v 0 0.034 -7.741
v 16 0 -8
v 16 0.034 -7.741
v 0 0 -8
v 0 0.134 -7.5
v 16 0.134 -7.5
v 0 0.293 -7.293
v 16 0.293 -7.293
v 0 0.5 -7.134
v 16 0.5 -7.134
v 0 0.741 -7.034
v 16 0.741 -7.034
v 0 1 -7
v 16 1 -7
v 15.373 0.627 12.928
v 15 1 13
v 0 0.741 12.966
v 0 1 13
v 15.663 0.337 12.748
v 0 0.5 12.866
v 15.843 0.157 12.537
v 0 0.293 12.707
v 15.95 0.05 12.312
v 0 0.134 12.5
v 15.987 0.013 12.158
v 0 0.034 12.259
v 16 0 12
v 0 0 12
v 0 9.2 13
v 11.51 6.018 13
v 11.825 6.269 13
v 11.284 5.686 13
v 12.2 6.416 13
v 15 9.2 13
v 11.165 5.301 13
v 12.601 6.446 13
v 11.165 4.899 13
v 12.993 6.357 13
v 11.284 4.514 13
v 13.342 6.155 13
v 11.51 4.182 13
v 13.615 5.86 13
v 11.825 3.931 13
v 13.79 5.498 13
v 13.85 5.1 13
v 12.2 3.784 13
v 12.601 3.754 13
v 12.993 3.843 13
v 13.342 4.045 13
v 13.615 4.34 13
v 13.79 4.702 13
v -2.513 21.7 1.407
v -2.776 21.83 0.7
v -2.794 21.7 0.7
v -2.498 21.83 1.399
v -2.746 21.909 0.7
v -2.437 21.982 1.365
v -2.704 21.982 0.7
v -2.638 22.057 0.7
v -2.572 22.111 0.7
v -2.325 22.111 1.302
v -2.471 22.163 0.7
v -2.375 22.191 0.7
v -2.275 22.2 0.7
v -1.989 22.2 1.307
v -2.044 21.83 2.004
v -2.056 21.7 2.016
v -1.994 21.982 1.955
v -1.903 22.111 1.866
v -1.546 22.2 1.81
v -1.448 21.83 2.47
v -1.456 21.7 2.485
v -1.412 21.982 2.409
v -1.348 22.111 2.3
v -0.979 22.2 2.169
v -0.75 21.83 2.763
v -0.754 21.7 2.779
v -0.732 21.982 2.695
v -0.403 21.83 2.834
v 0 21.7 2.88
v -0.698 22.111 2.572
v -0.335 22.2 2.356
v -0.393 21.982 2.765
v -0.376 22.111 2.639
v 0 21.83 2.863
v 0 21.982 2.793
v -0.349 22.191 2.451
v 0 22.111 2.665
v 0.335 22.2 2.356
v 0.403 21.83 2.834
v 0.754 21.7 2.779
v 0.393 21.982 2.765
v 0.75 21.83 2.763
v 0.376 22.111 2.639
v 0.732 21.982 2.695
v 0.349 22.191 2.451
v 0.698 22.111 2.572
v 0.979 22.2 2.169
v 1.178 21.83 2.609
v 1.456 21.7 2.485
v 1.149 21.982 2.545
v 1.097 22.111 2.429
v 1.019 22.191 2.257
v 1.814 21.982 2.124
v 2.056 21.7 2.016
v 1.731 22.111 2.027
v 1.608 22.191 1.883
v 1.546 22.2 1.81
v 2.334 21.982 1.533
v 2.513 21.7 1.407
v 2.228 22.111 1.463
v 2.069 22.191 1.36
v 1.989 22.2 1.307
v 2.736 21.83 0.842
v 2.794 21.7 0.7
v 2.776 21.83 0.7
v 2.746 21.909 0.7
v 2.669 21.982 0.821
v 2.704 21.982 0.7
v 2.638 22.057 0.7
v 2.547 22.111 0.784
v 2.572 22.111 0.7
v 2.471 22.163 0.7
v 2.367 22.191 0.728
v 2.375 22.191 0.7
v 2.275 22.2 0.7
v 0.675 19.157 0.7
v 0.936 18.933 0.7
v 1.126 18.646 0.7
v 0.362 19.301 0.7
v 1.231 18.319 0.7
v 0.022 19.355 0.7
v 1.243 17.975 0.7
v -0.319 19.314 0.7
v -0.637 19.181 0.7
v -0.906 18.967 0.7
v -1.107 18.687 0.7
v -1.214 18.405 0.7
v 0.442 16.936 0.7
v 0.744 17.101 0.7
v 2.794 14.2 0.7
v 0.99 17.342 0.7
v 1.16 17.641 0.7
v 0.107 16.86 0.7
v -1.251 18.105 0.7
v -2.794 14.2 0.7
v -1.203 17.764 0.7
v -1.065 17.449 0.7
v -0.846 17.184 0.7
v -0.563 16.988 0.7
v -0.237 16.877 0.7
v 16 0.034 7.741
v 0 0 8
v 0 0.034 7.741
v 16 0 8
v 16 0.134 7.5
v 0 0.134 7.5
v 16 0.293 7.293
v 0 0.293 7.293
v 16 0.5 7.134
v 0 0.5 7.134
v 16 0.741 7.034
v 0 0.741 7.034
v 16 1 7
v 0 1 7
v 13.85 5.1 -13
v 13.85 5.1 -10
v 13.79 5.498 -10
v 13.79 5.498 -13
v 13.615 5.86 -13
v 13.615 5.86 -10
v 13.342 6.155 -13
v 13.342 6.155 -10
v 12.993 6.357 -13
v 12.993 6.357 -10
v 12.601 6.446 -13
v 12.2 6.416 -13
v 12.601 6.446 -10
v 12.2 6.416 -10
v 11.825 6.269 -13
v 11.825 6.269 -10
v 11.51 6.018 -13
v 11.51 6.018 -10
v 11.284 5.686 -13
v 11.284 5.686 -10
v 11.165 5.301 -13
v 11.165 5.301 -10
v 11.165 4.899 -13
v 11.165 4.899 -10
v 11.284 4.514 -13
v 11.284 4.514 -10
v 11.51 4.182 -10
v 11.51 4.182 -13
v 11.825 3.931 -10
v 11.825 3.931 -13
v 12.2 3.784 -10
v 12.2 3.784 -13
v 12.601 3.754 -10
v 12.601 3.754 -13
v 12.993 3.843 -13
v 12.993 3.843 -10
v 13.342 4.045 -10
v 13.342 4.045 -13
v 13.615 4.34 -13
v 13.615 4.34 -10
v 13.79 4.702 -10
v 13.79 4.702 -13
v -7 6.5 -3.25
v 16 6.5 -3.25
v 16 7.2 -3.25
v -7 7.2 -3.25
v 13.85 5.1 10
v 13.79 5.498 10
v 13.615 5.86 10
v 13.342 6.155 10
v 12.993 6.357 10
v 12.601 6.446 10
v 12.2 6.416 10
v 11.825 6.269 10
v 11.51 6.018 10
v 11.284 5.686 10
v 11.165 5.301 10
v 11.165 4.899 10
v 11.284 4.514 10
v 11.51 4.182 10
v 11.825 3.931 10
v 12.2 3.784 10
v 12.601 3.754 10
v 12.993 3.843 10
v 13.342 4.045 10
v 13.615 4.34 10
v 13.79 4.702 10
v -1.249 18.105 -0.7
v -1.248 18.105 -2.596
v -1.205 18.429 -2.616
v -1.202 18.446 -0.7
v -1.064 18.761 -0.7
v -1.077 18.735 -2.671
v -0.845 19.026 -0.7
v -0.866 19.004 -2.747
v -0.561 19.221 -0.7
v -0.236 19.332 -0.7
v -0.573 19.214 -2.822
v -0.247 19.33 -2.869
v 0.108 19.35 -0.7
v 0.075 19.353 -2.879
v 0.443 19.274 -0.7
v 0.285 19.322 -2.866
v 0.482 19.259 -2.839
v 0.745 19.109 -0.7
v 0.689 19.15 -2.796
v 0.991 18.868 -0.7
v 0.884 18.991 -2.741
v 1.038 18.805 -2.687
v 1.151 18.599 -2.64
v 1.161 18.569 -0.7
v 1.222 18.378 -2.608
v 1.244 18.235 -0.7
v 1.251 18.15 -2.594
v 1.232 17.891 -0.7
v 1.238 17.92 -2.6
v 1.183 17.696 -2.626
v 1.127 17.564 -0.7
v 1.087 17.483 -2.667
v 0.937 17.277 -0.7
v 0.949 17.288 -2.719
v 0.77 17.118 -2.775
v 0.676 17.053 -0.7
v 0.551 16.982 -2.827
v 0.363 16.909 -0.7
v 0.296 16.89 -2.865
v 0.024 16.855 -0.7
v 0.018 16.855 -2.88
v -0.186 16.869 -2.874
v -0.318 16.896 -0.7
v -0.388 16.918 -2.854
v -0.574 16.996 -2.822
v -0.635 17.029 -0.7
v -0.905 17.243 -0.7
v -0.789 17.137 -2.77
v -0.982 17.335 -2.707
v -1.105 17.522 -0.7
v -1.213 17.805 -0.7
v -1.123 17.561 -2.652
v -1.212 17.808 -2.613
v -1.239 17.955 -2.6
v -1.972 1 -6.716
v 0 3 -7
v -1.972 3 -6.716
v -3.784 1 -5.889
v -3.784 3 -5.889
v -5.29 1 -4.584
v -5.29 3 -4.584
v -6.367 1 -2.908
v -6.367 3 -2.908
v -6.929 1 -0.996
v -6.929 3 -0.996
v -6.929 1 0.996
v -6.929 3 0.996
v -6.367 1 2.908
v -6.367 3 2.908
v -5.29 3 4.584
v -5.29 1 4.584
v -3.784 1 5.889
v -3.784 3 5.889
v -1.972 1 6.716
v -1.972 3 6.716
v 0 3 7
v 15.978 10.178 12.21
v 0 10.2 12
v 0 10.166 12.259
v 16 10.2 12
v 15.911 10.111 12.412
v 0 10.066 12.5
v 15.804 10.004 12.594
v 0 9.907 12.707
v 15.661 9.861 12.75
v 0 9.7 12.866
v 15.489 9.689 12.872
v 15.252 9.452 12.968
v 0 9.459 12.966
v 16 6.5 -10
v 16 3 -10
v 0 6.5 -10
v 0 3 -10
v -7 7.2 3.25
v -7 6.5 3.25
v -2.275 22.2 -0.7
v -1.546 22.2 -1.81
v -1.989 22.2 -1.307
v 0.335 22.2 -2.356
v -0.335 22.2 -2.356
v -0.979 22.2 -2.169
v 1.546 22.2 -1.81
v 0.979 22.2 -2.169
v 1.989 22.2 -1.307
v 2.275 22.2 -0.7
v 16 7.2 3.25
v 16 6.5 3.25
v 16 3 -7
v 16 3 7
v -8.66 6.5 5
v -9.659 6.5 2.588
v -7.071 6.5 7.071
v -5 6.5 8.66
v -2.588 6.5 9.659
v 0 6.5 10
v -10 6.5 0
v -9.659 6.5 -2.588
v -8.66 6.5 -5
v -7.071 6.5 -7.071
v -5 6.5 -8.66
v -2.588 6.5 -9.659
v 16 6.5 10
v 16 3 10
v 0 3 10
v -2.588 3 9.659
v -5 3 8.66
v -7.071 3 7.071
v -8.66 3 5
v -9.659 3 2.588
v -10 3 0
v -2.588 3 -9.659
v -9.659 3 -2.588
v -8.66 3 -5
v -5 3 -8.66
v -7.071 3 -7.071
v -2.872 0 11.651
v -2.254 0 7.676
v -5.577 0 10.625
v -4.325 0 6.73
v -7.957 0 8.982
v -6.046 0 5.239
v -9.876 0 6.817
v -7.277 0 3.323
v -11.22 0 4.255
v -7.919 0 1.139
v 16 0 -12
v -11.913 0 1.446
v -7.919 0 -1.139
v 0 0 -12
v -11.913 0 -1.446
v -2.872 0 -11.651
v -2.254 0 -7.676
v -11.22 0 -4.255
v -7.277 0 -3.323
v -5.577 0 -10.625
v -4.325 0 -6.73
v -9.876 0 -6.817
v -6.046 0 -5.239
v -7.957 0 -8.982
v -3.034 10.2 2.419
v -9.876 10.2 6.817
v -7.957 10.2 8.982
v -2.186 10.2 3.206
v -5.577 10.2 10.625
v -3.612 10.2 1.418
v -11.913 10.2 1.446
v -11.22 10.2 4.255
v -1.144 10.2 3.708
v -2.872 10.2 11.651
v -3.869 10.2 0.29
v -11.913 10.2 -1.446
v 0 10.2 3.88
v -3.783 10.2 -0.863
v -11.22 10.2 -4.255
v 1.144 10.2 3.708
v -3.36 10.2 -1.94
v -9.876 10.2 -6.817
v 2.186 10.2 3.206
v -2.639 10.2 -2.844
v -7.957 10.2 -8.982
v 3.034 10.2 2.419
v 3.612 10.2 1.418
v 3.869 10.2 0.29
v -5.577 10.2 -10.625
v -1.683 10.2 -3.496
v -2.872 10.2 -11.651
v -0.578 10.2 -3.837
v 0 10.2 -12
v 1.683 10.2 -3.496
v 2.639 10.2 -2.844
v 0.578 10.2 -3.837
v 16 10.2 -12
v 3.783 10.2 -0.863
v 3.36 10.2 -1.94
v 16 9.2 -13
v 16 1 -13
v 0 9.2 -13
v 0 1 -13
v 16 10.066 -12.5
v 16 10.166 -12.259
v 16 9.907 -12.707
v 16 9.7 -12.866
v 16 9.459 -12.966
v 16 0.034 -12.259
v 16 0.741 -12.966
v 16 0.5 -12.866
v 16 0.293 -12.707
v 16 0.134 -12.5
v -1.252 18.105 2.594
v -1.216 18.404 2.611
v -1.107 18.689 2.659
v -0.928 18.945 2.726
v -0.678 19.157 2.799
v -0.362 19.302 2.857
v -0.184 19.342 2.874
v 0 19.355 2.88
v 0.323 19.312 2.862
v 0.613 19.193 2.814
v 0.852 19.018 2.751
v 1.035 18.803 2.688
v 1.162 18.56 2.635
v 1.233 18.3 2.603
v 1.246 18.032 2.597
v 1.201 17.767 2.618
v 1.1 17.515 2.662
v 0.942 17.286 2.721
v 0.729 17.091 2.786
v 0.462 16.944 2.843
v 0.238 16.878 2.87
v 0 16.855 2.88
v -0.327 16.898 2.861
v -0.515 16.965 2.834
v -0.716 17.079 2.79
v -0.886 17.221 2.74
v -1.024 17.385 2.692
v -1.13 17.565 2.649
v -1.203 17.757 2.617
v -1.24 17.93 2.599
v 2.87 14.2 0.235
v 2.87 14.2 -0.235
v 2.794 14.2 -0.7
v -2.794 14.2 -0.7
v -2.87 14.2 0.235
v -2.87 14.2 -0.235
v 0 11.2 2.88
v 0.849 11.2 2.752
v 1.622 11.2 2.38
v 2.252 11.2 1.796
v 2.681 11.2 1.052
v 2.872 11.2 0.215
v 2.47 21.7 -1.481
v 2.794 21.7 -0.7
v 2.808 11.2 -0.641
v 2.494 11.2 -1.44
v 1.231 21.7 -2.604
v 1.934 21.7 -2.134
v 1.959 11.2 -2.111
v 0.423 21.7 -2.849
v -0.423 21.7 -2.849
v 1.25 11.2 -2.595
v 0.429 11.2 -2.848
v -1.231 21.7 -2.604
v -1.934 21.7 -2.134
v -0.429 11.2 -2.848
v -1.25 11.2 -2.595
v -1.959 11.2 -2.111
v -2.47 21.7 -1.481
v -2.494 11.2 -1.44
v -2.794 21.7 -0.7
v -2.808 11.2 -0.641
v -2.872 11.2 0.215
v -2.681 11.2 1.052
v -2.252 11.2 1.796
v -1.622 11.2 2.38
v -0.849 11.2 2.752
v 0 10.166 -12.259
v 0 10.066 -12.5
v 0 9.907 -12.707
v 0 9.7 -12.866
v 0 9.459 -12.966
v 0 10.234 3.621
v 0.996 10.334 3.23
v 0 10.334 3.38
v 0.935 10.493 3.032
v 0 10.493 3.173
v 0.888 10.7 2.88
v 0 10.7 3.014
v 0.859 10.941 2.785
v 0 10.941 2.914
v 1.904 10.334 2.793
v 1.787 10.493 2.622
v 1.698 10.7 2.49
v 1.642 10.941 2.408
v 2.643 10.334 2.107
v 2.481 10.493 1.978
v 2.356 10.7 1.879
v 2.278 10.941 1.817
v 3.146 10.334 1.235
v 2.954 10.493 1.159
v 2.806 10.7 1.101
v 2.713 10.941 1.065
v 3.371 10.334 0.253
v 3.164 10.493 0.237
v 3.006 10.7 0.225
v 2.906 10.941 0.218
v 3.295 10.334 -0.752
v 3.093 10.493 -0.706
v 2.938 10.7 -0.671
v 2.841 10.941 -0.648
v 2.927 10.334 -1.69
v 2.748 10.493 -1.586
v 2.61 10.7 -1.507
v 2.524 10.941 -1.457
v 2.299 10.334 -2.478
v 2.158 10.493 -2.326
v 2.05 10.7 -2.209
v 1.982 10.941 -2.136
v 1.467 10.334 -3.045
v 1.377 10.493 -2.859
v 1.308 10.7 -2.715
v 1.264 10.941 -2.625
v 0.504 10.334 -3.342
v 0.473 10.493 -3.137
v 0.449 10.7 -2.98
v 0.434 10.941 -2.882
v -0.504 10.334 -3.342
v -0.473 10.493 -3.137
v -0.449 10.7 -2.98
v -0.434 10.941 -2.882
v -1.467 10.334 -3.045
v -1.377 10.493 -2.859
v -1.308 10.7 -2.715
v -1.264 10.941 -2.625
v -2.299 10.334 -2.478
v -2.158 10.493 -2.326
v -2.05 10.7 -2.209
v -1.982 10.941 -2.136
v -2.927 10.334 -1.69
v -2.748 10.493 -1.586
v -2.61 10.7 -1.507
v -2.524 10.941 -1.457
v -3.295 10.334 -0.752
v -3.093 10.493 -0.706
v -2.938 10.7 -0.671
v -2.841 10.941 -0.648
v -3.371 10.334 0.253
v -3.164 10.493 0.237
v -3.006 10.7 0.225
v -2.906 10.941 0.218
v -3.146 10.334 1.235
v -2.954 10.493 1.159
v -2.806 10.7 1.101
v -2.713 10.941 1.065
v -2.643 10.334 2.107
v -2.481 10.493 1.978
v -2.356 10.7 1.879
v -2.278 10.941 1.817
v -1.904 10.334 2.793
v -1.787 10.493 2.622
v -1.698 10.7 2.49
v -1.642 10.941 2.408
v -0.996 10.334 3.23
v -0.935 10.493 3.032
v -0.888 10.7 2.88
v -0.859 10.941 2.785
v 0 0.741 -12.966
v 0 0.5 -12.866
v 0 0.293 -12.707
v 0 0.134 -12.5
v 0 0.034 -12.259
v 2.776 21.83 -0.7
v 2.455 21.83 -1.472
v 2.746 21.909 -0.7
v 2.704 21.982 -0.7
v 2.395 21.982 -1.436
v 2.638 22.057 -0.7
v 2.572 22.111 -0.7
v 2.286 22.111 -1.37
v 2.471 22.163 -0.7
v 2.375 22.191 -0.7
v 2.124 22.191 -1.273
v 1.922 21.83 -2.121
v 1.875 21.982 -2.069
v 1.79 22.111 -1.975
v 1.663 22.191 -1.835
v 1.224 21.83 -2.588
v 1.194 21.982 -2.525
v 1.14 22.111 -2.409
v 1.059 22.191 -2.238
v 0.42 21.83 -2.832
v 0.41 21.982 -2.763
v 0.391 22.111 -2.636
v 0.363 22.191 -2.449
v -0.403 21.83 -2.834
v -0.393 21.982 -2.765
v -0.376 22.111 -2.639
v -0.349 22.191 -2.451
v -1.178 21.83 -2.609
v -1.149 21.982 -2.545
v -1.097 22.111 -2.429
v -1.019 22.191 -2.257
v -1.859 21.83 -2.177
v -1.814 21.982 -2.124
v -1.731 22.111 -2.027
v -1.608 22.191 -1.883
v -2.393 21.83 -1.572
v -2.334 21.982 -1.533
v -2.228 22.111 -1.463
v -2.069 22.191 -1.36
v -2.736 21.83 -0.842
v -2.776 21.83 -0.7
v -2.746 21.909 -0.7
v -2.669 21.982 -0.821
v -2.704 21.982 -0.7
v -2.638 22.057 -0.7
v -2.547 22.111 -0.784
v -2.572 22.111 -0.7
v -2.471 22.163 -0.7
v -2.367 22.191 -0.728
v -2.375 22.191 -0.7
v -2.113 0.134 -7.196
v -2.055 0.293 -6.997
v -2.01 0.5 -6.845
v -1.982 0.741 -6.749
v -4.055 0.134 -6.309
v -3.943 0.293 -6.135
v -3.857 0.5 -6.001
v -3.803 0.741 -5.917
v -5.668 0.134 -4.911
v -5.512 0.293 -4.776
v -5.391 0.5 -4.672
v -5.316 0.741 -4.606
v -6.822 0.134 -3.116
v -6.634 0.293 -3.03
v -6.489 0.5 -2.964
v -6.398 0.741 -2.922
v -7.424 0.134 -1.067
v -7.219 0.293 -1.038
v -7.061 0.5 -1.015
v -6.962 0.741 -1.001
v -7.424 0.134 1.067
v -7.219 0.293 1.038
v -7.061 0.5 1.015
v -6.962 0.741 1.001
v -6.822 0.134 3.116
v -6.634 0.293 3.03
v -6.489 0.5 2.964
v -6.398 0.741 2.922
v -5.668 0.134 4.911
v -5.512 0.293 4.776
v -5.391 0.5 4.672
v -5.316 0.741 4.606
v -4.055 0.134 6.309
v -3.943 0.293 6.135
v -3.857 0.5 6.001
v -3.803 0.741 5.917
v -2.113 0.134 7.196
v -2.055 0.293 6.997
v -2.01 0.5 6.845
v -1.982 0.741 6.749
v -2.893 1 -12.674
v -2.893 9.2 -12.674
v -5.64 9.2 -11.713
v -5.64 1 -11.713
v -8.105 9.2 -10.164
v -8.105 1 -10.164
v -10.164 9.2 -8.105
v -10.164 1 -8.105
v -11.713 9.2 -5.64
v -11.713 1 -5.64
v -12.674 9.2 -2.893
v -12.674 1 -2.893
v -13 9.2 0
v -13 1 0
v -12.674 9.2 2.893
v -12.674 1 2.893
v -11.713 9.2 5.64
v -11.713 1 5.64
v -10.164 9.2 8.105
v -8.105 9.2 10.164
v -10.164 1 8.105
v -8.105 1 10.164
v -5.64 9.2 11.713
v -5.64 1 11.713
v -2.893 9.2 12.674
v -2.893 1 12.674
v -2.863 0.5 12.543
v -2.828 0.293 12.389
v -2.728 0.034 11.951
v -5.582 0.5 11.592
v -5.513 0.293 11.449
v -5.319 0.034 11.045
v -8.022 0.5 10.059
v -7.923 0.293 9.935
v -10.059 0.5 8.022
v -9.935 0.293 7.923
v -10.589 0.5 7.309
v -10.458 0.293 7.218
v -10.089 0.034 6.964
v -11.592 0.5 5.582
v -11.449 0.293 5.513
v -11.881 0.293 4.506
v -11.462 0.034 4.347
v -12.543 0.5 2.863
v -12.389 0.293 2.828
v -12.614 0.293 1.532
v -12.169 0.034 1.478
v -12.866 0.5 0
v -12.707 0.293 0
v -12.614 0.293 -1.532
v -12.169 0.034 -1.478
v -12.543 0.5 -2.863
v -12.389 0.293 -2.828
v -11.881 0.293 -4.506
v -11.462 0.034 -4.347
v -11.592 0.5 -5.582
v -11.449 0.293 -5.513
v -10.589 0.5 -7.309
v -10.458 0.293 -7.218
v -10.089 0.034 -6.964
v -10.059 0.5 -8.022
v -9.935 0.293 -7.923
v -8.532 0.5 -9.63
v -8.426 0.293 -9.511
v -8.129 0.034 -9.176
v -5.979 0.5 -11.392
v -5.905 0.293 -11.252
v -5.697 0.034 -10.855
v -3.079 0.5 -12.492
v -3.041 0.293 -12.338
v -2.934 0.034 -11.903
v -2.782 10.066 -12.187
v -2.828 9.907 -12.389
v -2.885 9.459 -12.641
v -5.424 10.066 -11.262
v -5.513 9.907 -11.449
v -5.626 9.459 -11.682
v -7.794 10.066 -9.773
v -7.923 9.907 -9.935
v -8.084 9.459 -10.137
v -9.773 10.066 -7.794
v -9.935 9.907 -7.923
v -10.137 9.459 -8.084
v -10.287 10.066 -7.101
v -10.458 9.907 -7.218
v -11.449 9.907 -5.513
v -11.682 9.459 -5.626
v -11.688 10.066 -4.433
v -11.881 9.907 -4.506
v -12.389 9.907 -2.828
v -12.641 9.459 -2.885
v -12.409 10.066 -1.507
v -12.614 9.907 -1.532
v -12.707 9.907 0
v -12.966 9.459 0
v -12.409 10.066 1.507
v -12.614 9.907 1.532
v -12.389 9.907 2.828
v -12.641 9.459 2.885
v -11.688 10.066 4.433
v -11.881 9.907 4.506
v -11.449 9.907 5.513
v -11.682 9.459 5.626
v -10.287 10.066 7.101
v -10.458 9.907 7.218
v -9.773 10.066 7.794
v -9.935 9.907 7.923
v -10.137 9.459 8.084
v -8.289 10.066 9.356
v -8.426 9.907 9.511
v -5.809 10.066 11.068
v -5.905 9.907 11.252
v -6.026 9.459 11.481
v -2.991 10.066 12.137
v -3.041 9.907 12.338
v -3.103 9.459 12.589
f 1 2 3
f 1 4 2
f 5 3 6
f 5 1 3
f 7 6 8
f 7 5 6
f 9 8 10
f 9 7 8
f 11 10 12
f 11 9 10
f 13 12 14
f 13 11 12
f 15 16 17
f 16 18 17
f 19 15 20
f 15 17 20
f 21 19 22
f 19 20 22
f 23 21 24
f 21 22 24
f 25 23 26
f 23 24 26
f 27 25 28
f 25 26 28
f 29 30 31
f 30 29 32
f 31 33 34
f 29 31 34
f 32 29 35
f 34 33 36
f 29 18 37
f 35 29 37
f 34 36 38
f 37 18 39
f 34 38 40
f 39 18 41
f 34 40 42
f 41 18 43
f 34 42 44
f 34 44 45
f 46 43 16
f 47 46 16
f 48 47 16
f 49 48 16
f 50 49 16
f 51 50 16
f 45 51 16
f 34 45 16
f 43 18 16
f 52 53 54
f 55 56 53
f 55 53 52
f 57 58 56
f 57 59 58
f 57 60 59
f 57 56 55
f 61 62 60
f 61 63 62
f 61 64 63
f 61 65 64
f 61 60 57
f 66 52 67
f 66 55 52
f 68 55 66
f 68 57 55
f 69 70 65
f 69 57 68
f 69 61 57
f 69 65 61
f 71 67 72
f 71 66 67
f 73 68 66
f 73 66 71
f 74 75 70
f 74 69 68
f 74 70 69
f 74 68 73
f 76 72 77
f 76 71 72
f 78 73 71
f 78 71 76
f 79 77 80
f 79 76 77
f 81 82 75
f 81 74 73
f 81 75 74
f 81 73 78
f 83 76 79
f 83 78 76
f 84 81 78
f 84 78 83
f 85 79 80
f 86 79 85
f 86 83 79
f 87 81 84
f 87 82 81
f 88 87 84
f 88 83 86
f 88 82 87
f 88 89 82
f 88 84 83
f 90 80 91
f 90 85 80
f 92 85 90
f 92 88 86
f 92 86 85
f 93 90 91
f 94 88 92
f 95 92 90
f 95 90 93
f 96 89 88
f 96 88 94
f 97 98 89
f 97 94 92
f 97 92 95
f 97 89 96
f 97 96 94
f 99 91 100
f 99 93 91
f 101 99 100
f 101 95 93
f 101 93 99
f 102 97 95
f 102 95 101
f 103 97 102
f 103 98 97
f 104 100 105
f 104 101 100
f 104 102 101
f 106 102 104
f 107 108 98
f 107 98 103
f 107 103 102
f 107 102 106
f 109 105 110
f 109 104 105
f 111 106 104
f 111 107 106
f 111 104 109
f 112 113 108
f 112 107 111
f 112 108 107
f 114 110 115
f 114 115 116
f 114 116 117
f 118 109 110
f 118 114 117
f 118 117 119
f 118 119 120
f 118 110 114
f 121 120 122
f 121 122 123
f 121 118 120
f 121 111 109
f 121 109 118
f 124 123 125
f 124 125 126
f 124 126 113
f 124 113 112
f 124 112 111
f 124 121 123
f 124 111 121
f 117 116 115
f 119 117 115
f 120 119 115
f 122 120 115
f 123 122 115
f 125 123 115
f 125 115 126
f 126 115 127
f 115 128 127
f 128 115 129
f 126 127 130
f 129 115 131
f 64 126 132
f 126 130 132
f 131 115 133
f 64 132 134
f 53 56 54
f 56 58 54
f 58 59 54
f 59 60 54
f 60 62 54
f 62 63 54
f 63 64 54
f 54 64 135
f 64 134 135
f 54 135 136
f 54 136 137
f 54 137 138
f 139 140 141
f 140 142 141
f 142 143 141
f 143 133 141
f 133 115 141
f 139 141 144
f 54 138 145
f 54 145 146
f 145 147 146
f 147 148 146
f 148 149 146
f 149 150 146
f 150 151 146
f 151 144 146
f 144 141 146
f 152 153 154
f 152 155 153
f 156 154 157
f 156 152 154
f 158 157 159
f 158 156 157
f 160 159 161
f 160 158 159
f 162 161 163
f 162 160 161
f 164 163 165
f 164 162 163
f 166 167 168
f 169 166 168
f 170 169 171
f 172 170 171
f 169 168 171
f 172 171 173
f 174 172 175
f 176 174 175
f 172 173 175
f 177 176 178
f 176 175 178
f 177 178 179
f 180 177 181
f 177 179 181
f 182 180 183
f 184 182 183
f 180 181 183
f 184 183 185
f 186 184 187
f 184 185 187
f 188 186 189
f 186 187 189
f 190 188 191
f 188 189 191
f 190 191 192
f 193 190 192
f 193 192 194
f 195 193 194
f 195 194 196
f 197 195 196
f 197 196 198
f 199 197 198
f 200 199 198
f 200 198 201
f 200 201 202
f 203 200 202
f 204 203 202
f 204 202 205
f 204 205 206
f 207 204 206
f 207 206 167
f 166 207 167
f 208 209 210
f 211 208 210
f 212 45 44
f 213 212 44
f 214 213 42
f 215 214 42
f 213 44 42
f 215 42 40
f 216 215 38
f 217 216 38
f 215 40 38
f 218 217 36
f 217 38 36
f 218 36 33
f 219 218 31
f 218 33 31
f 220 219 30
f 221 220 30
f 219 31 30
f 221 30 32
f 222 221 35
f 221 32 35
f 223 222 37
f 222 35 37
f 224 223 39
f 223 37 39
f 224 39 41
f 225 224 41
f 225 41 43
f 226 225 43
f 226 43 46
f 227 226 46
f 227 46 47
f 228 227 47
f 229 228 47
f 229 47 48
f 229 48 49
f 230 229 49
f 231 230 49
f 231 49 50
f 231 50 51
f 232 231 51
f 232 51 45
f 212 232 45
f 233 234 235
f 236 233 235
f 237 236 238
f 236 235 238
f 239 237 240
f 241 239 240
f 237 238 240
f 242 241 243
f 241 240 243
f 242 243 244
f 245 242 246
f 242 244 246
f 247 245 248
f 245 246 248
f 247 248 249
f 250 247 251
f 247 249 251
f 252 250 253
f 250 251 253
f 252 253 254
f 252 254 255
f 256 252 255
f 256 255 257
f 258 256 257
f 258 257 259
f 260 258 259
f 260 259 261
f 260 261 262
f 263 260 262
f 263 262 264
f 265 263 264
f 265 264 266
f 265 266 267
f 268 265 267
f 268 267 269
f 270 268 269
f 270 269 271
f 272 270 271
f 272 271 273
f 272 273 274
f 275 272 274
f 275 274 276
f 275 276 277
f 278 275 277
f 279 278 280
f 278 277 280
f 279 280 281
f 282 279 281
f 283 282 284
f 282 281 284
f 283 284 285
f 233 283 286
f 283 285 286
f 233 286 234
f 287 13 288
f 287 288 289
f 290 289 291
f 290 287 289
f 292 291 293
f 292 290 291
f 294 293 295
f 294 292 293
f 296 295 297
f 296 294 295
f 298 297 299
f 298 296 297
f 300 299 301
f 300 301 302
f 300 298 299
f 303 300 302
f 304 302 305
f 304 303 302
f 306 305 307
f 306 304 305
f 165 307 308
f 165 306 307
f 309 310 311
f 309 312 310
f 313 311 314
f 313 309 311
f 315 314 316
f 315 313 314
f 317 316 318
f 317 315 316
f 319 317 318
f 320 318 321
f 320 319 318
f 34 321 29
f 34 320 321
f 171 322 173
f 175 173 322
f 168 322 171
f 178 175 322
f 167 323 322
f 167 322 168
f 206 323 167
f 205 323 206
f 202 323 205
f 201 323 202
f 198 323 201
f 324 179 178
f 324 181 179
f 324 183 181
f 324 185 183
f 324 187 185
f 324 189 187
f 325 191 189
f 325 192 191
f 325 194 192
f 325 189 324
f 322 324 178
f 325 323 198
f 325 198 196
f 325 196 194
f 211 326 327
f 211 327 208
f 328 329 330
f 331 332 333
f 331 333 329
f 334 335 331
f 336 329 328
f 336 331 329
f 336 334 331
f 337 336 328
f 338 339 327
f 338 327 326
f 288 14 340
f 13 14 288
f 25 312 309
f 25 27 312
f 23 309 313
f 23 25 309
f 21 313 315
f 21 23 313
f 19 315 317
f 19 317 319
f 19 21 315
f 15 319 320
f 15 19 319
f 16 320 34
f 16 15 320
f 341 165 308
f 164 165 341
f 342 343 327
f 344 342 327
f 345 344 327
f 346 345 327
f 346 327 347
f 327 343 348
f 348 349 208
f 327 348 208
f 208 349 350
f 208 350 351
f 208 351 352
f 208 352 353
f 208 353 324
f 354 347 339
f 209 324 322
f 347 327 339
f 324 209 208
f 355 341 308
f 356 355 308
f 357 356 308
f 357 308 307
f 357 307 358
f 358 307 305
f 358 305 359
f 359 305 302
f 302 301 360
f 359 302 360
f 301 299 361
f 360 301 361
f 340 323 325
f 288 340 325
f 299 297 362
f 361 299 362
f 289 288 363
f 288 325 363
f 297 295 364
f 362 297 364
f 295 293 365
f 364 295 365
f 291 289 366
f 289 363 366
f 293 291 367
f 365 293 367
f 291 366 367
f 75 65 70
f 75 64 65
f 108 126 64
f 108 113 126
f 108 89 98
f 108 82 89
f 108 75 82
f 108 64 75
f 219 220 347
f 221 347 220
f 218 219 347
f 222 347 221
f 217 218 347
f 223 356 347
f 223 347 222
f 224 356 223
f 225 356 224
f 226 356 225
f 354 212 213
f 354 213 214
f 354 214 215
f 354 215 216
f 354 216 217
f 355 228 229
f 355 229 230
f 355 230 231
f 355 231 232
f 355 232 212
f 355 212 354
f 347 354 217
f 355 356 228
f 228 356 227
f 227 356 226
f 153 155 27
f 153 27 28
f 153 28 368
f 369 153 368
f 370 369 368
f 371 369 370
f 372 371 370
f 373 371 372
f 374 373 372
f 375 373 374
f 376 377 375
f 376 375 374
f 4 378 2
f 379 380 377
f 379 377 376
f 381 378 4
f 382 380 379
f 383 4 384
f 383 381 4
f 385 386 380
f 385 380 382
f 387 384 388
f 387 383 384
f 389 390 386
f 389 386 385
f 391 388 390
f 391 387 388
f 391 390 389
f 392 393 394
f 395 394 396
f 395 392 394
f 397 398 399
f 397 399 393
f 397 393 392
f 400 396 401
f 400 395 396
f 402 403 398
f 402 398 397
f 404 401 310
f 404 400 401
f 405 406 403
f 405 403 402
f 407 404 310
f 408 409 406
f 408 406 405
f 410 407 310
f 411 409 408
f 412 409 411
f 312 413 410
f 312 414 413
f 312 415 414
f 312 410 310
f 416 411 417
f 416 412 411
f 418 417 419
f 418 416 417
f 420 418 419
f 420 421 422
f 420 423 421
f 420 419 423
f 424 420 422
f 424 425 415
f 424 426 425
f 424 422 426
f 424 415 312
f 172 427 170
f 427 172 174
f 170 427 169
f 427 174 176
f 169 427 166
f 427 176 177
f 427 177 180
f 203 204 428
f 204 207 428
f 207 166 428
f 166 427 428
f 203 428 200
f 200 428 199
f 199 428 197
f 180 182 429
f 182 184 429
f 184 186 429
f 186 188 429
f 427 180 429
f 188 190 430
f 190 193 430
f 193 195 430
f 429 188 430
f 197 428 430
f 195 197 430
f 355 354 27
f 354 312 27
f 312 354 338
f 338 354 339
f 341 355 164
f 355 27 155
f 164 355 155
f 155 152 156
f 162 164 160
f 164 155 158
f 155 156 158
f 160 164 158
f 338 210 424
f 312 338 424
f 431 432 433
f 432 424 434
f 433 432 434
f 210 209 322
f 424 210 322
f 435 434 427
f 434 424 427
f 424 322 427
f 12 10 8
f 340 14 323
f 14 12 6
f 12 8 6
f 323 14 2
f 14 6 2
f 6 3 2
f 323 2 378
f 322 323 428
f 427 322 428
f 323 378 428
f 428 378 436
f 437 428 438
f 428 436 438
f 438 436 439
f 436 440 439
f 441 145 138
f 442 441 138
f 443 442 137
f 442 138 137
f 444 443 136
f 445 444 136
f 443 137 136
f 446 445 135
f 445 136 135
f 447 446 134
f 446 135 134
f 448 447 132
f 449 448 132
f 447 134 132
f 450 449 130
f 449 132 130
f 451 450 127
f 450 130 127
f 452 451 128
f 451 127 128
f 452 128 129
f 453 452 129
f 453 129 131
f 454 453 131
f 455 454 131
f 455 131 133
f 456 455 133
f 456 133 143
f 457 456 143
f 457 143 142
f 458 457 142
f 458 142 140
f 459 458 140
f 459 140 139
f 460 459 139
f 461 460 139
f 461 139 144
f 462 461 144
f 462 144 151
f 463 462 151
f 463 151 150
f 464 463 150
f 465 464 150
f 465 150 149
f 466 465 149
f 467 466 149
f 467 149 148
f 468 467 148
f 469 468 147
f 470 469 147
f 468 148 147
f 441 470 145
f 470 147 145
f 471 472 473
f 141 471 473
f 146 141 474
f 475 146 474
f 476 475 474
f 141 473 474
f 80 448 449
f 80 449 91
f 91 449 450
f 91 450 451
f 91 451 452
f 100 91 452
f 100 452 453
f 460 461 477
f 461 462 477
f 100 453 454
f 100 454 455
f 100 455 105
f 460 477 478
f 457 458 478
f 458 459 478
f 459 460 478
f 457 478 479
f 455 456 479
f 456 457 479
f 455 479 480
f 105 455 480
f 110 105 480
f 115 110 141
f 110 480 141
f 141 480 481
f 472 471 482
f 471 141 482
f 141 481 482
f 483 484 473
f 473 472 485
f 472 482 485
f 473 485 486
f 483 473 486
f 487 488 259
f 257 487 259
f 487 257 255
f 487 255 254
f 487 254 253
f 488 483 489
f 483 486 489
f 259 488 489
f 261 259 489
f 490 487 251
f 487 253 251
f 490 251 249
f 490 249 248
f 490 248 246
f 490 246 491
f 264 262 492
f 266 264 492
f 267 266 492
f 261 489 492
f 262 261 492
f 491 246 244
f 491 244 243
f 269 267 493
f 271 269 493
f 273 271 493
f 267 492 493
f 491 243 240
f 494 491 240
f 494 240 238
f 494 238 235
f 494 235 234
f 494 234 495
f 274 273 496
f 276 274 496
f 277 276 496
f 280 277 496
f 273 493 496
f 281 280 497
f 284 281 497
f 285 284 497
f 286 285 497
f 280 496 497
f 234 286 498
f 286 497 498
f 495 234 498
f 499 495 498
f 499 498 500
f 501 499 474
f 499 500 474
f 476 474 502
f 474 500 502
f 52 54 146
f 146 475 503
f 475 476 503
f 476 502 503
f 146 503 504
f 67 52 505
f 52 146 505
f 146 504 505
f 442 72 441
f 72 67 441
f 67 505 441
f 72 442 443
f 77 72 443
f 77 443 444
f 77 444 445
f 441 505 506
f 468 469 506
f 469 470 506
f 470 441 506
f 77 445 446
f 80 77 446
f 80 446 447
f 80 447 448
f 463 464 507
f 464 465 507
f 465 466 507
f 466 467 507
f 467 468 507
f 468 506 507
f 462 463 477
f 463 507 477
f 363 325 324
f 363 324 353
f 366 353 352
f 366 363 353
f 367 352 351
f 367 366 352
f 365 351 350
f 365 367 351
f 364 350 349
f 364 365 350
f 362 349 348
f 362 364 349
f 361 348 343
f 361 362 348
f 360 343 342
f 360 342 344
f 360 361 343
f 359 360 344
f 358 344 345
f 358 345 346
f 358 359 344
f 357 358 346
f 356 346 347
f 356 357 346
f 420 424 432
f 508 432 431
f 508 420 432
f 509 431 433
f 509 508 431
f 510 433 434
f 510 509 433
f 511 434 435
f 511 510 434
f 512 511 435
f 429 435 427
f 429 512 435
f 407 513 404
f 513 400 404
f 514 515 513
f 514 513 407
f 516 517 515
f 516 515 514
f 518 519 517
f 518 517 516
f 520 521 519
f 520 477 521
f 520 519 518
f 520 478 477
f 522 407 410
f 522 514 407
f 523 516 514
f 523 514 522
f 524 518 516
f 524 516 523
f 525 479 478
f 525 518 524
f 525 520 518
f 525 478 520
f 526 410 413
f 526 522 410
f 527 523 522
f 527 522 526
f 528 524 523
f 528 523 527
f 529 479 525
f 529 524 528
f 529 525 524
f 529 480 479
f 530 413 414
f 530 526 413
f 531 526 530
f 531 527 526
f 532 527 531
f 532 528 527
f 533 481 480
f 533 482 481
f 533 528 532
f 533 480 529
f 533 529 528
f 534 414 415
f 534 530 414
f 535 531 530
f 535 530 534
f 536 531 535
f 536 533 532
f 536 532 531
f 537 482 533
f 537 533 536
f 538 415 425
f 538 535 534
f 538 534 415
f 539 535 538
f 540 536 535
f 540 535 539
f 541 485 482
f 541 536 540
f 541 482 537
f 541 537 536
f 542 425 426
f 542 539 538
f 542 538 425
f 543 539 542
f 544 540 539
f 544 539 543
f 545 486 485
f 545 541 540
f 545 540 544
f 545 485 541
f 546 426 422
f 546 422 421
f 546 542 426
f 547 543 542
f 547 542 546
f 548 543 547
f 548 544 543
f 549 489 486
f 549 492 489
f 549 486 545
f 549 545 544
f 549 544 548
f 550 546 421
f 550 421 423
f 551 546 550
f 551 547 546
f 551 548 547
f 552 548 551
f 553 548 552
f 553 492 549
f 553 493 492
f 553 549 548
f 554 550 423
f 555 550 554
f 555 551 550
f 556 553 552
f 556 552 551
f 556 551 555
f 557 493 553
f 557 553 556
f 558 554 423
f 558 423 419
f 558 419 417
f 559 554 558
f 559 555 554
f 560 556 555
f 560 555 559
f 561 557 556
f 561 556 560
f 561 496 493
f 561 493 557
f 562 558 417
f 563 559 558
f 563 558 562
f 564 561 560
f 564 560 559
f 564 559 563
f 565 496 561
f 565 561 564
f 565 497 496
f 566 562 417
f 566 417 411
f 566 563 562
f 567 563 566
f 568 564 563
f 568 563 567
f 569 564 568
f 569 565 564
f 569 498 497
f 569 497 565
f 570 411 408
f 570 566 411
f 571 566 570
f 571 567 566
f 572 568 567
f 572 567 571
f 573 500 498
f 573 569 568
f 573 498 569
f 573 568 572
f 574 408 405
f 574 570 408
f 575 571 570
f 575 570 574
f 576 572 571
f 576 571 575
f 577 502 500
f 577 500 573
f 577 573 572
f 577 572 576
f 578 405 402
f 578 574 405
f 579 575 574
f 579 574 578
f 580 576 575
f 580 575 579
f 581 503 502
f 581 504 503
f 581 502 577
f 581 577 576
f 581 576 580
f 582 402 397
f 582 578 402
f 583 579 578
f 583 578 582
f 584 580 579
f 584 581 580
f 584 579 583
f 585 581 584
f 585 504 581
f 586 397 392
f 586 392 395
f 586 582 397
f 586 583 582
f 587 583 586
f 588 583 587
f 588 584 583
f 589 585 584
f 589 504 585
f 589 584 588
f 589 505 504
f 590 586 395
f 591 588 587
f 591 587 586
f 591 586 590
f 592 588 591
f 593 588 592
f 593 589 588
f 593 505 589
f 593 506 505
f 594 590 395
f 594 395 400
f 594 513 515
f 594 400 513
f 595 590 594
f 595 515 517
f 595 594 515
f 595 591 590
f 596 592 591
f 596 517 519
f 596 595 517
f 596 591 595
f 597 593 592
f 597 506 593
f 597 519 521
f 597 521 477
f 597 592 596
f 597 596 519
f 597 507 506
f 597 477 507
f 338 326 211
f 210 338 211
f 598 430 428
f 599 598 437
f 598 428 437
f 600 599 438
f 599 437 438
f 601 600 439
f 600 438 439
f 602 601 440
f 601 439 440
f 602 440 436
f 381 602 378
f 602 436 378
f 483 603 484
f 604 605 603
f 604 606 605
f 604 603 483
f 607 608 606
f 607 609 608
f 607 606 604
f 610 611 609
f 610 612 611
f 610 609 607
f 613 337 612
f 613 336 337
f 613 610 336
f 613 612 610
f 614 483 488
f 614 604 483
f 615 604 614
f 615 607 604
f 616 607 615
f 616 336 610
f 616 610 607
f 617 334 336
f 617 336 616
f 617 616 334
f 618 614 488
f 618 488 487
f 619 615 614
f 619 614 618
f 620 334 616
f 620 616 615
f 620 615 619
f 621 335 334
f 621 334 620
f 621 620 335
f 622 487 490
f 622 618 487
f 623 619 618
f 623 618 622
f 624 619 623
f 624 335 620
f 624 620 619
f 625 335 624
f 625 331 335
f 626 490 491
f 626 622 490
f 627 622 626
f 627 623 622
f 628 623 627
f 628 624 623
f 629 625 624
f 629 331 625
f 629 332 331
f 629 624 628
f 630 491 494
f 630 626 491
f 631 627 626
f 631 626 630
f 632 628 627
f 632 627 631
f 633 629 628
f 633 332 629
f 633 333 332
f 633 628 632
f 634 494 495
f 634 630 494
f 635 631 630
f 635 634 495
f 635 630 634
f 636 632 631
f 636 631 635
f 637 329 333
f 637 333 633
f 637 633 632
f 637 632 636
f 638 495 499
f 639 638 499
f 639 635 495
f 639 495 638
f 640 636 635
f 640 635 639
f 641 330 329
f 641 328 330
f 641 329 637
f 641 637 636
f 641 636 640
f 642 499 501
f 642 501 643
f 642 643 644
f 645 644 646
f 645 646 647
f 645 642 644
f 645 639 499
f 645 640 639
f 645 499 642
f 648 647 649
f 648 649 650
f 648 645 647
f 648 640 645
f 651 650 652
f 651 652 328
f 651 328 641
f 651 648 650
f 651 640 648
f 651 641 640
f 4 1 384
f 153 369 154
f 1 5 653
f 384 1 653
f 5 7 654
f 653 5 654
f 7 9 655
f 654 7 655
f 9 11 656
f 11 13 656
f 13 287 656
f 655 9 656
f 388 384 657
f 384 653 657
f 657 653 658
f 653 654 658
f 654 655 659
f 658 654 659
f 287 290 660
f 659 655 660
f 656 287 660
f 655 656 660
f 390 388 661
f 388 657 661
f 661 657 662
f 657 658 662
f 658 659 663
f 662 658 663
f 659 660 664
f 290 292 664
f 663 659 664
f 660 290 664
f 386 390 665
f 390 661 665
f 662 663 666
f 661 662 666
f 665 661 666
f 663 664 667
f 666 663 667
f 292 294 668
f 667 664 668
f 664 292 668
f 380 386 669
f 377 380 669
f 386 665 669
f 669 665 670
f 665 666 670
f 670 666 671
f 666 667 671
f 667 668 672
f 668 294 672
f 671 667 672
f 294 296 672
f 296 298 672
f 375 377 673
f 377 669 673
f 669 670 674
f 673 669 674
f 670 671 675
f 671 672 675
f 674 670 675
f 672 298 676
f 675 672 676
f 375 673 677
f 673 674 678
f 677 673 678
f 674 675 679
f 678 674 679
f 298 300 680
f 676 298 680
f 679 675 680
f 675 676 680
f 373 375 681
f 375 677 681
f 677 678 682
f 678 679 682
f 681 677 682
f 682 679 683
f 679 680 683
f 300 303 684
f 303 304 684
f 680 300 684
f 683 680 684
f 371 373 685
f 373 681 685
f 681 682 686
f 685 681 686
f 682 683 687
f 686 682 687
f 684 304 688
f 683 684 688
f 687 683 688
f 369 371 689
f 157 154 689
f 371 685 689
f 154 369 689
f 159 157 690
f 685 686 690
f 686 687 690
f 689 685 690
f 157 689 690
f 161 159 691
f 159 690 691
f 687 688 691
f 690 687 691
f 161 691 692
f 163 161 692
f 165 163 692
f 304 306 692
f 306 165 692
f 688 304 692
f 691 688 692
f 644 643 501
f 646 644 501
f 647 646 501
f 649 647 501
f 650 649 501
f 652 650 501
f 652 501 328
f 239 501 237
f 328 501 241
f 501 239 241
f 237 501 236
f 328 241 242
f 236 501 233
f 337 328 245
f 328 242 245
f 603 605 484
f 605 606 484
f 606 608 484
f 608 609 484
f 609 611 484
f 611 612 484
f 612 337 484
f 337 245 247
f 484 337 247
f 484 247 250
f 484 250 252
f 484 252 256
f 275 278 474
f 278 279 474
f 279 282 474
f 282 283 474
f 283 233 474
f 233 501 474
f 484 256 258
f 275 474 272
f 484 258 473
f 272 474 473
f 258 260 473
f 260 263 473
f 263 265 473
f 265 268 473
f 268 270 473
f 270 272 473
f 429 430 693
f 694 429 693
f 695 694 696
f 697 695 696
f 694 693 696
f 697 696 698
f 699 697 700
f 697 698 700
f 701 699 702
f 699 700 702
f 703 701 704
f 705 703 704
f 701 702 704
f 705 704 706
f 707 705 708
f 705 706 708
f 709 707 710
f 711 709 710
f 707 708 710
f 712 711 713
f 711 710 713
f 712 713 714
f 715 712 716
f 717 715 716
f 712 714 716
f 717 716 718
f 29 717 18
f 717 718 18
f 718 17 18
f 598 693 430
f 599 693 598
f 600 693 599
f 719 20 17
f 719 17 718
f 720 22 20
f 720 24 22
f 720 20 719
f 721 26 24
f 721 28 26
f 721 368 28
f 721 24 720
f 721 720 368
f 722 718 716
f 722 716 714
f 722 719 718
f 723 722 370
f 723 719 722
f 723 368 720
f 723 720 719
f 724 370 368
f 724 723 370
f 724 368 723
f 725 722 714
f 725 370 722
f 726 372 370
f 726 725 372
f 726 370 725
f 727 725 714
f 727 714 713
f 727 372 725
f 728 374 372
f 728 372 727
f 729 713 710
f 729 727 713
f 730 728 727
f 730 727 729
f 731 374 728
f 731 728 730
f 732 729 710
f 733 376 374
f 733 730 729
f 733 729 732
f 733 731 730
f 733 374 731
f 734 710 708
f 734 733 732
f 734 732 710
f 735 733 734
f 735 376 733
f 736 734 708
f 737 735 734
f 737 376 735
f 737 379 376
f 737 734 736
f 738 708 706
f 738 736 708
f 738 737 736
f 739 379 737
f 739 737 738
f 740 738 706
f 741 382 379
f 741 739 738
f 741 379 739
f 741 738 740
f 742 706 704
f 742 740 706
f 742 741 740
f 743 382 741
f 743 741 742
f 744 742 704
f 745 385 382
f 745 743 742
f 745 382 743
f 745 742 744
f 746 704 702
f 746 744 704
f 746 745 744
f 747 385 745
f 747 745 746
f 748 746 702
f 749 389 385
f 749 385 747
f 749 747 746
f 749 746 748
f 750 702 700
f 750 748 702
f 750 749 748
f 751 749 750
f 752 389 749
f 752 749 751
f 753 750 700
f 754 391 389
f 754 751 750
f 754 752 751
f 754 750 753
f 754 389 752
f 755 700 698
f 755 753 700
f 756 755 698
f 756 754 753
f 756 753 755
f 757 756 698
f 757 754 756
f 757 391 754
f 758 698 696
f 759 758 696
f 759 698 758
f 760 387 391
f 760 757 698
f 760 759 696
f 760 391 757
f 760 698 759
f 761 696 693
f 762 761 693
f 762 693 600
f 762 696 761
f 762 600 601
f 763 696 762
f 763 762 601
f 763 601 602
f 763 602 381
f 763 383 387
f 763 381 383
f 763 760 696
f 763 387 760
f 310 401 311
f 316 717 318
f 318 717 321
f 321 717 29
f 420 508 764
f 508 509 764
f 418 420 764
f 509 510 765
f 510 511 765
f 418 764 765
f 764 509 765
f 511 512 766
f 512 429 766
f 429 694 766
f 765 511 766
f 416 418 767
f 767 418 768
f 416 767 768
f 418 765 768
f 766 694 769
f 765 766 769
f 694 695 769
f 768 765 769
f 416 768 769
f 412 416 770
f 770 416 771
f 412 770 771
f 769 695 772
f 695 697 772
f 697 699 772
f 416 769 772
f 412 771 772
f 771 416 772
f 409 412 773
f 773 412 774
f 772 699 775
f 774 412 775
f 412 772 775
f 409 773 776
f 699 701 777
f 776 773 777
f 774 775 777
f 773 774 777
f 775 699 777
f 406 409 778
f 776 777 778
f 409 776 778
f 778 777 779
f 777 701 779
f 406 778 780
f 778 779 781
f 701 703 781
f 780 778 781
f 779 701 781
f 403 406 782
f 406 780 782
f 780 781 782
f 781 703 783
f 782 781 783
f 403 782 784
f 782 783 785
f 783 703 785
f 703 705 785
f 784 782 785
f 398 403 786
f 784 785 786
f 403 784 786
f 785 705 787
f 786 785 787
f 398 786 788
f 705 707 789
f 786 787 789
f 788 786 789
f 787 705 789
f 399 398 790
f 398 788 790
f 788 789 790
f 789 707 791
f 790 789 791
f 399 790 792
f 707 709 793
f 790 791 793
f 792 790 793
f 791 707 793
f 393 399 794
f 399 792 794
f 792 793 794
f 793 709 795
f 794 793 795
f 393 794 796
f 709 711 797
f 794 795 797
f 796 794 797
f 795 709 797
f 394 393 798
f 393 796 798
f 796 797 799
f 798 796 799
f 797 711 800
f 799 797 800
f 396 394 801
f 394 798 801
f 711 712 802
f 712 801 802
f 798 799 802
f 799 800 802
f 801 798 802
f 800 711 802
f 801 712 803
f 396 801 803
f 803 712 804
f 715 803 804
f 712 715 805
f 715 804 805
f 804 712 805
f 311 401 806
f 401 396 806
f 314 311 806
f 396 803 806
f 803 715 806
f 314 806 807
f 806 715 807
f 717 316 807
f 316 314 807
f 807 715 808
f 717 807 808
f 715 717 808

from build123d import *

# Parameters (mm, degrees)
BOSS_EXTRUDE1_DEPTH   = 3
BOSS_EXTRUDE2_DEPTH   = 3.5
BOSS_EXTRUDE3_DEPTH   = 3.7
SKETCH4_R             = 2.88
BOSS_EXTRUDE4_DEPTH   = 12
SKETCH11_W            = 6.5
SKETCH11_H            = 0.7
CUT_EXTRUDE3_DEPTH    = 23
F_2_5MM_DOWEL_HOLE1_D = 2.5
SKETCH8_R             = 1.35
CUT_EXTRUDE1_DEPTH    = 38.747052924
FILLET1_R             = 1
FILLET2_R             = 1
CUT_EXTRUDE2_START    = -8
CUT_EXTRUDE2_DEPTH    = 8
FILLET3_R             = 0.5


with BuildPart() as part:
    # Sketch1 → Boss-Extrude1 (new body)
    with BuildSketch(Plane(origin=(0, 0, 0), x_dir=(1, 0, 0), z_dir=(0, 1, 0))):
        with BuildLine():
            Line((0, 13), (16, 13))
            Line((16, 13), (16, 7))
            Line((16, 7), (0, 7))
            ThreePointArc((0, 7), (-7, 0), (0, -7))
            Line((0, -7), (16, -7))
            Line((16, -7), (16, -13))
            Line((16, -13), (0, -13))
            ThreePointArc((0, -13), (-13, 0), (0, 13))
        make_face()
    extrude(amount=BOSS_EXTRUDE1_DEPTH)

    # Sketch2 → Boss-Extrude2 (add)
    with BuildSketch(Plane(origin=(0, 3, 0), x_dir=(1, 0, 0), z_dir=(0, 1, 0))):
        with BuildLine():
            Line((0, 13), (16, 13))
            Line((16, 13), (16, 10))
            Line((16, 10), (0, 10))
            ThreePointArc((0, 10), (-10, 0), (0, -10))
            Line((0, -10), (16, -10))
            Line((16, -10), (16, -13))
            Line((16, -13), (0, -13))
            ThreePointArc((0, -13), (-13, 0), (0, 13))
        make_face()
    extrude(amount=BOSS_EXTRUDE2_DEPTH)

    # Sketch3 → Boss-Extrude3 (add)
    with BuildSketch(Plane(origin=(0, 6.5, 0), x_dir=(1, 0, 0), z_dir=(0, 1, 0))):
        with BuildLine():
            Line((16, 13), (0, 13))
            ThreePointArc((0, 13), (-13, 0), (0, -13))
            Line((0, -13), (16, -13))
            Line((16, -13), (16, -7))
            Line((16, -7), (16, 7))
            Line((16, 7), (16, 13))
        make_face()
    extrude(amount=BOSS_EXTRUDE3_DEPTH)

    # Sketch4 → Boss-Extrude4 (add)
    with BuildSketch(Plane(origin=(0, 10.2, 0), x_dir=(1, 0, 0), z_dir=(0, 1, 0))):
        with Locations(Location((0, 0, 0), (0, 0, 270))):
            Circle(SKETCH4_R)
    extrude(amount=BOSS_EXTRUDE4_DEPTH)

    # Sketch11 → Cut-Extrude3 (cut)
    with BuildSketch(Plane(origin=(16, 0, 0), x_dir=(0, 0, -1), z_dir=(1, 0, 0))):
        with Locations((0, 6.85)):
            Rectangle(SKETCH11_W, SKETCH11_H)
    extrude(amount=-CUT_EXTRUDE3_DEPTH, mode=Mode.SUBTRACT)

    # Ø2.5mm Dowel Hole1 (through all)
    with Locations(Plane(origin=(-0.002429038, 18.104937254, 2.879998976), x_dir=(0.999999644325, 0, 0.000843415861), z_dir=(-0.000843415861, 0, 0.999999644325))):
        with Locations((0, 0)):
            Hole(F_2_5MM_DOWEL_HOLE1_D / 2)

    # Sketch8 → Cut-Extrude1 (cut, through all)
    with BuildSketch(Plane.XY.offset(13)):
        with Locations((12.5, 5.1)):
            Circle(SKETCH8_R)
    extrude(amount=-CUT_EXTRUDE1_DEPTH, mode=Mode.SUBTRACT)

    # Fillet1
    fillet1_edges = [part.edges().sort_by_distance(p)[0] for p in [
        (8, 0, -13),
        (8, 0, -7),
        (-7, 0, 0),
        (16, 5.1, 13),
        (-13, 10.2, 0),
        (8, 10.2, 13),
        (8, 10.2, -13),
        (8, 0, 7),
        (8, 0, 13),
        (-13, 0, 0),
    ]]
    fillet(fillet1_edges, radius=FILLET1_R)

    # Fillet2
    fillet2_edges = [part.edges().sort_by_distance(p)[0] for p in [
        (0, 10.2, -2.88),
    ]]
    fillet(fillet2_edges, radius=FILLET2_R)

    # Sketch10 → Cut-Extrude2 (cut)
    with BuildSketch(Plane(origin=(0, 22.2, 0), x_dir=(1, 0, 0), z_dir=(0, 1, 0)).offset(CUT_EXTRUDE2_START)):
        with BuildLine():
            Line((-2.793635624, 0.7), (2.793635624, 0.7))
            ThreePointArc((2.793635624, 0.7), (2.88, 0), (2.793635624, -0.7))
            Line((2.793635624, -0.7), (-2.793635624, -0.7))
            ThreePointArc((-2.793635624, -0.7), (-2.88, 0), (-2.793635624, 0.7))
        make_face()
    extrude(amount=CUT_EXTRUDE2_DEPTH, mode=Mode.SUBTRACT)

    # Fillet3
    fillet3_edges = [part.edges().sort_by_distance(p)[0] for p in [
        (0, 22.2, -2.88),
        (1.771778767, 22.2, 2.270506551),
    ]]
    fillet(fillet3_edges, radius=FILLET3_R)


solid = part.part
